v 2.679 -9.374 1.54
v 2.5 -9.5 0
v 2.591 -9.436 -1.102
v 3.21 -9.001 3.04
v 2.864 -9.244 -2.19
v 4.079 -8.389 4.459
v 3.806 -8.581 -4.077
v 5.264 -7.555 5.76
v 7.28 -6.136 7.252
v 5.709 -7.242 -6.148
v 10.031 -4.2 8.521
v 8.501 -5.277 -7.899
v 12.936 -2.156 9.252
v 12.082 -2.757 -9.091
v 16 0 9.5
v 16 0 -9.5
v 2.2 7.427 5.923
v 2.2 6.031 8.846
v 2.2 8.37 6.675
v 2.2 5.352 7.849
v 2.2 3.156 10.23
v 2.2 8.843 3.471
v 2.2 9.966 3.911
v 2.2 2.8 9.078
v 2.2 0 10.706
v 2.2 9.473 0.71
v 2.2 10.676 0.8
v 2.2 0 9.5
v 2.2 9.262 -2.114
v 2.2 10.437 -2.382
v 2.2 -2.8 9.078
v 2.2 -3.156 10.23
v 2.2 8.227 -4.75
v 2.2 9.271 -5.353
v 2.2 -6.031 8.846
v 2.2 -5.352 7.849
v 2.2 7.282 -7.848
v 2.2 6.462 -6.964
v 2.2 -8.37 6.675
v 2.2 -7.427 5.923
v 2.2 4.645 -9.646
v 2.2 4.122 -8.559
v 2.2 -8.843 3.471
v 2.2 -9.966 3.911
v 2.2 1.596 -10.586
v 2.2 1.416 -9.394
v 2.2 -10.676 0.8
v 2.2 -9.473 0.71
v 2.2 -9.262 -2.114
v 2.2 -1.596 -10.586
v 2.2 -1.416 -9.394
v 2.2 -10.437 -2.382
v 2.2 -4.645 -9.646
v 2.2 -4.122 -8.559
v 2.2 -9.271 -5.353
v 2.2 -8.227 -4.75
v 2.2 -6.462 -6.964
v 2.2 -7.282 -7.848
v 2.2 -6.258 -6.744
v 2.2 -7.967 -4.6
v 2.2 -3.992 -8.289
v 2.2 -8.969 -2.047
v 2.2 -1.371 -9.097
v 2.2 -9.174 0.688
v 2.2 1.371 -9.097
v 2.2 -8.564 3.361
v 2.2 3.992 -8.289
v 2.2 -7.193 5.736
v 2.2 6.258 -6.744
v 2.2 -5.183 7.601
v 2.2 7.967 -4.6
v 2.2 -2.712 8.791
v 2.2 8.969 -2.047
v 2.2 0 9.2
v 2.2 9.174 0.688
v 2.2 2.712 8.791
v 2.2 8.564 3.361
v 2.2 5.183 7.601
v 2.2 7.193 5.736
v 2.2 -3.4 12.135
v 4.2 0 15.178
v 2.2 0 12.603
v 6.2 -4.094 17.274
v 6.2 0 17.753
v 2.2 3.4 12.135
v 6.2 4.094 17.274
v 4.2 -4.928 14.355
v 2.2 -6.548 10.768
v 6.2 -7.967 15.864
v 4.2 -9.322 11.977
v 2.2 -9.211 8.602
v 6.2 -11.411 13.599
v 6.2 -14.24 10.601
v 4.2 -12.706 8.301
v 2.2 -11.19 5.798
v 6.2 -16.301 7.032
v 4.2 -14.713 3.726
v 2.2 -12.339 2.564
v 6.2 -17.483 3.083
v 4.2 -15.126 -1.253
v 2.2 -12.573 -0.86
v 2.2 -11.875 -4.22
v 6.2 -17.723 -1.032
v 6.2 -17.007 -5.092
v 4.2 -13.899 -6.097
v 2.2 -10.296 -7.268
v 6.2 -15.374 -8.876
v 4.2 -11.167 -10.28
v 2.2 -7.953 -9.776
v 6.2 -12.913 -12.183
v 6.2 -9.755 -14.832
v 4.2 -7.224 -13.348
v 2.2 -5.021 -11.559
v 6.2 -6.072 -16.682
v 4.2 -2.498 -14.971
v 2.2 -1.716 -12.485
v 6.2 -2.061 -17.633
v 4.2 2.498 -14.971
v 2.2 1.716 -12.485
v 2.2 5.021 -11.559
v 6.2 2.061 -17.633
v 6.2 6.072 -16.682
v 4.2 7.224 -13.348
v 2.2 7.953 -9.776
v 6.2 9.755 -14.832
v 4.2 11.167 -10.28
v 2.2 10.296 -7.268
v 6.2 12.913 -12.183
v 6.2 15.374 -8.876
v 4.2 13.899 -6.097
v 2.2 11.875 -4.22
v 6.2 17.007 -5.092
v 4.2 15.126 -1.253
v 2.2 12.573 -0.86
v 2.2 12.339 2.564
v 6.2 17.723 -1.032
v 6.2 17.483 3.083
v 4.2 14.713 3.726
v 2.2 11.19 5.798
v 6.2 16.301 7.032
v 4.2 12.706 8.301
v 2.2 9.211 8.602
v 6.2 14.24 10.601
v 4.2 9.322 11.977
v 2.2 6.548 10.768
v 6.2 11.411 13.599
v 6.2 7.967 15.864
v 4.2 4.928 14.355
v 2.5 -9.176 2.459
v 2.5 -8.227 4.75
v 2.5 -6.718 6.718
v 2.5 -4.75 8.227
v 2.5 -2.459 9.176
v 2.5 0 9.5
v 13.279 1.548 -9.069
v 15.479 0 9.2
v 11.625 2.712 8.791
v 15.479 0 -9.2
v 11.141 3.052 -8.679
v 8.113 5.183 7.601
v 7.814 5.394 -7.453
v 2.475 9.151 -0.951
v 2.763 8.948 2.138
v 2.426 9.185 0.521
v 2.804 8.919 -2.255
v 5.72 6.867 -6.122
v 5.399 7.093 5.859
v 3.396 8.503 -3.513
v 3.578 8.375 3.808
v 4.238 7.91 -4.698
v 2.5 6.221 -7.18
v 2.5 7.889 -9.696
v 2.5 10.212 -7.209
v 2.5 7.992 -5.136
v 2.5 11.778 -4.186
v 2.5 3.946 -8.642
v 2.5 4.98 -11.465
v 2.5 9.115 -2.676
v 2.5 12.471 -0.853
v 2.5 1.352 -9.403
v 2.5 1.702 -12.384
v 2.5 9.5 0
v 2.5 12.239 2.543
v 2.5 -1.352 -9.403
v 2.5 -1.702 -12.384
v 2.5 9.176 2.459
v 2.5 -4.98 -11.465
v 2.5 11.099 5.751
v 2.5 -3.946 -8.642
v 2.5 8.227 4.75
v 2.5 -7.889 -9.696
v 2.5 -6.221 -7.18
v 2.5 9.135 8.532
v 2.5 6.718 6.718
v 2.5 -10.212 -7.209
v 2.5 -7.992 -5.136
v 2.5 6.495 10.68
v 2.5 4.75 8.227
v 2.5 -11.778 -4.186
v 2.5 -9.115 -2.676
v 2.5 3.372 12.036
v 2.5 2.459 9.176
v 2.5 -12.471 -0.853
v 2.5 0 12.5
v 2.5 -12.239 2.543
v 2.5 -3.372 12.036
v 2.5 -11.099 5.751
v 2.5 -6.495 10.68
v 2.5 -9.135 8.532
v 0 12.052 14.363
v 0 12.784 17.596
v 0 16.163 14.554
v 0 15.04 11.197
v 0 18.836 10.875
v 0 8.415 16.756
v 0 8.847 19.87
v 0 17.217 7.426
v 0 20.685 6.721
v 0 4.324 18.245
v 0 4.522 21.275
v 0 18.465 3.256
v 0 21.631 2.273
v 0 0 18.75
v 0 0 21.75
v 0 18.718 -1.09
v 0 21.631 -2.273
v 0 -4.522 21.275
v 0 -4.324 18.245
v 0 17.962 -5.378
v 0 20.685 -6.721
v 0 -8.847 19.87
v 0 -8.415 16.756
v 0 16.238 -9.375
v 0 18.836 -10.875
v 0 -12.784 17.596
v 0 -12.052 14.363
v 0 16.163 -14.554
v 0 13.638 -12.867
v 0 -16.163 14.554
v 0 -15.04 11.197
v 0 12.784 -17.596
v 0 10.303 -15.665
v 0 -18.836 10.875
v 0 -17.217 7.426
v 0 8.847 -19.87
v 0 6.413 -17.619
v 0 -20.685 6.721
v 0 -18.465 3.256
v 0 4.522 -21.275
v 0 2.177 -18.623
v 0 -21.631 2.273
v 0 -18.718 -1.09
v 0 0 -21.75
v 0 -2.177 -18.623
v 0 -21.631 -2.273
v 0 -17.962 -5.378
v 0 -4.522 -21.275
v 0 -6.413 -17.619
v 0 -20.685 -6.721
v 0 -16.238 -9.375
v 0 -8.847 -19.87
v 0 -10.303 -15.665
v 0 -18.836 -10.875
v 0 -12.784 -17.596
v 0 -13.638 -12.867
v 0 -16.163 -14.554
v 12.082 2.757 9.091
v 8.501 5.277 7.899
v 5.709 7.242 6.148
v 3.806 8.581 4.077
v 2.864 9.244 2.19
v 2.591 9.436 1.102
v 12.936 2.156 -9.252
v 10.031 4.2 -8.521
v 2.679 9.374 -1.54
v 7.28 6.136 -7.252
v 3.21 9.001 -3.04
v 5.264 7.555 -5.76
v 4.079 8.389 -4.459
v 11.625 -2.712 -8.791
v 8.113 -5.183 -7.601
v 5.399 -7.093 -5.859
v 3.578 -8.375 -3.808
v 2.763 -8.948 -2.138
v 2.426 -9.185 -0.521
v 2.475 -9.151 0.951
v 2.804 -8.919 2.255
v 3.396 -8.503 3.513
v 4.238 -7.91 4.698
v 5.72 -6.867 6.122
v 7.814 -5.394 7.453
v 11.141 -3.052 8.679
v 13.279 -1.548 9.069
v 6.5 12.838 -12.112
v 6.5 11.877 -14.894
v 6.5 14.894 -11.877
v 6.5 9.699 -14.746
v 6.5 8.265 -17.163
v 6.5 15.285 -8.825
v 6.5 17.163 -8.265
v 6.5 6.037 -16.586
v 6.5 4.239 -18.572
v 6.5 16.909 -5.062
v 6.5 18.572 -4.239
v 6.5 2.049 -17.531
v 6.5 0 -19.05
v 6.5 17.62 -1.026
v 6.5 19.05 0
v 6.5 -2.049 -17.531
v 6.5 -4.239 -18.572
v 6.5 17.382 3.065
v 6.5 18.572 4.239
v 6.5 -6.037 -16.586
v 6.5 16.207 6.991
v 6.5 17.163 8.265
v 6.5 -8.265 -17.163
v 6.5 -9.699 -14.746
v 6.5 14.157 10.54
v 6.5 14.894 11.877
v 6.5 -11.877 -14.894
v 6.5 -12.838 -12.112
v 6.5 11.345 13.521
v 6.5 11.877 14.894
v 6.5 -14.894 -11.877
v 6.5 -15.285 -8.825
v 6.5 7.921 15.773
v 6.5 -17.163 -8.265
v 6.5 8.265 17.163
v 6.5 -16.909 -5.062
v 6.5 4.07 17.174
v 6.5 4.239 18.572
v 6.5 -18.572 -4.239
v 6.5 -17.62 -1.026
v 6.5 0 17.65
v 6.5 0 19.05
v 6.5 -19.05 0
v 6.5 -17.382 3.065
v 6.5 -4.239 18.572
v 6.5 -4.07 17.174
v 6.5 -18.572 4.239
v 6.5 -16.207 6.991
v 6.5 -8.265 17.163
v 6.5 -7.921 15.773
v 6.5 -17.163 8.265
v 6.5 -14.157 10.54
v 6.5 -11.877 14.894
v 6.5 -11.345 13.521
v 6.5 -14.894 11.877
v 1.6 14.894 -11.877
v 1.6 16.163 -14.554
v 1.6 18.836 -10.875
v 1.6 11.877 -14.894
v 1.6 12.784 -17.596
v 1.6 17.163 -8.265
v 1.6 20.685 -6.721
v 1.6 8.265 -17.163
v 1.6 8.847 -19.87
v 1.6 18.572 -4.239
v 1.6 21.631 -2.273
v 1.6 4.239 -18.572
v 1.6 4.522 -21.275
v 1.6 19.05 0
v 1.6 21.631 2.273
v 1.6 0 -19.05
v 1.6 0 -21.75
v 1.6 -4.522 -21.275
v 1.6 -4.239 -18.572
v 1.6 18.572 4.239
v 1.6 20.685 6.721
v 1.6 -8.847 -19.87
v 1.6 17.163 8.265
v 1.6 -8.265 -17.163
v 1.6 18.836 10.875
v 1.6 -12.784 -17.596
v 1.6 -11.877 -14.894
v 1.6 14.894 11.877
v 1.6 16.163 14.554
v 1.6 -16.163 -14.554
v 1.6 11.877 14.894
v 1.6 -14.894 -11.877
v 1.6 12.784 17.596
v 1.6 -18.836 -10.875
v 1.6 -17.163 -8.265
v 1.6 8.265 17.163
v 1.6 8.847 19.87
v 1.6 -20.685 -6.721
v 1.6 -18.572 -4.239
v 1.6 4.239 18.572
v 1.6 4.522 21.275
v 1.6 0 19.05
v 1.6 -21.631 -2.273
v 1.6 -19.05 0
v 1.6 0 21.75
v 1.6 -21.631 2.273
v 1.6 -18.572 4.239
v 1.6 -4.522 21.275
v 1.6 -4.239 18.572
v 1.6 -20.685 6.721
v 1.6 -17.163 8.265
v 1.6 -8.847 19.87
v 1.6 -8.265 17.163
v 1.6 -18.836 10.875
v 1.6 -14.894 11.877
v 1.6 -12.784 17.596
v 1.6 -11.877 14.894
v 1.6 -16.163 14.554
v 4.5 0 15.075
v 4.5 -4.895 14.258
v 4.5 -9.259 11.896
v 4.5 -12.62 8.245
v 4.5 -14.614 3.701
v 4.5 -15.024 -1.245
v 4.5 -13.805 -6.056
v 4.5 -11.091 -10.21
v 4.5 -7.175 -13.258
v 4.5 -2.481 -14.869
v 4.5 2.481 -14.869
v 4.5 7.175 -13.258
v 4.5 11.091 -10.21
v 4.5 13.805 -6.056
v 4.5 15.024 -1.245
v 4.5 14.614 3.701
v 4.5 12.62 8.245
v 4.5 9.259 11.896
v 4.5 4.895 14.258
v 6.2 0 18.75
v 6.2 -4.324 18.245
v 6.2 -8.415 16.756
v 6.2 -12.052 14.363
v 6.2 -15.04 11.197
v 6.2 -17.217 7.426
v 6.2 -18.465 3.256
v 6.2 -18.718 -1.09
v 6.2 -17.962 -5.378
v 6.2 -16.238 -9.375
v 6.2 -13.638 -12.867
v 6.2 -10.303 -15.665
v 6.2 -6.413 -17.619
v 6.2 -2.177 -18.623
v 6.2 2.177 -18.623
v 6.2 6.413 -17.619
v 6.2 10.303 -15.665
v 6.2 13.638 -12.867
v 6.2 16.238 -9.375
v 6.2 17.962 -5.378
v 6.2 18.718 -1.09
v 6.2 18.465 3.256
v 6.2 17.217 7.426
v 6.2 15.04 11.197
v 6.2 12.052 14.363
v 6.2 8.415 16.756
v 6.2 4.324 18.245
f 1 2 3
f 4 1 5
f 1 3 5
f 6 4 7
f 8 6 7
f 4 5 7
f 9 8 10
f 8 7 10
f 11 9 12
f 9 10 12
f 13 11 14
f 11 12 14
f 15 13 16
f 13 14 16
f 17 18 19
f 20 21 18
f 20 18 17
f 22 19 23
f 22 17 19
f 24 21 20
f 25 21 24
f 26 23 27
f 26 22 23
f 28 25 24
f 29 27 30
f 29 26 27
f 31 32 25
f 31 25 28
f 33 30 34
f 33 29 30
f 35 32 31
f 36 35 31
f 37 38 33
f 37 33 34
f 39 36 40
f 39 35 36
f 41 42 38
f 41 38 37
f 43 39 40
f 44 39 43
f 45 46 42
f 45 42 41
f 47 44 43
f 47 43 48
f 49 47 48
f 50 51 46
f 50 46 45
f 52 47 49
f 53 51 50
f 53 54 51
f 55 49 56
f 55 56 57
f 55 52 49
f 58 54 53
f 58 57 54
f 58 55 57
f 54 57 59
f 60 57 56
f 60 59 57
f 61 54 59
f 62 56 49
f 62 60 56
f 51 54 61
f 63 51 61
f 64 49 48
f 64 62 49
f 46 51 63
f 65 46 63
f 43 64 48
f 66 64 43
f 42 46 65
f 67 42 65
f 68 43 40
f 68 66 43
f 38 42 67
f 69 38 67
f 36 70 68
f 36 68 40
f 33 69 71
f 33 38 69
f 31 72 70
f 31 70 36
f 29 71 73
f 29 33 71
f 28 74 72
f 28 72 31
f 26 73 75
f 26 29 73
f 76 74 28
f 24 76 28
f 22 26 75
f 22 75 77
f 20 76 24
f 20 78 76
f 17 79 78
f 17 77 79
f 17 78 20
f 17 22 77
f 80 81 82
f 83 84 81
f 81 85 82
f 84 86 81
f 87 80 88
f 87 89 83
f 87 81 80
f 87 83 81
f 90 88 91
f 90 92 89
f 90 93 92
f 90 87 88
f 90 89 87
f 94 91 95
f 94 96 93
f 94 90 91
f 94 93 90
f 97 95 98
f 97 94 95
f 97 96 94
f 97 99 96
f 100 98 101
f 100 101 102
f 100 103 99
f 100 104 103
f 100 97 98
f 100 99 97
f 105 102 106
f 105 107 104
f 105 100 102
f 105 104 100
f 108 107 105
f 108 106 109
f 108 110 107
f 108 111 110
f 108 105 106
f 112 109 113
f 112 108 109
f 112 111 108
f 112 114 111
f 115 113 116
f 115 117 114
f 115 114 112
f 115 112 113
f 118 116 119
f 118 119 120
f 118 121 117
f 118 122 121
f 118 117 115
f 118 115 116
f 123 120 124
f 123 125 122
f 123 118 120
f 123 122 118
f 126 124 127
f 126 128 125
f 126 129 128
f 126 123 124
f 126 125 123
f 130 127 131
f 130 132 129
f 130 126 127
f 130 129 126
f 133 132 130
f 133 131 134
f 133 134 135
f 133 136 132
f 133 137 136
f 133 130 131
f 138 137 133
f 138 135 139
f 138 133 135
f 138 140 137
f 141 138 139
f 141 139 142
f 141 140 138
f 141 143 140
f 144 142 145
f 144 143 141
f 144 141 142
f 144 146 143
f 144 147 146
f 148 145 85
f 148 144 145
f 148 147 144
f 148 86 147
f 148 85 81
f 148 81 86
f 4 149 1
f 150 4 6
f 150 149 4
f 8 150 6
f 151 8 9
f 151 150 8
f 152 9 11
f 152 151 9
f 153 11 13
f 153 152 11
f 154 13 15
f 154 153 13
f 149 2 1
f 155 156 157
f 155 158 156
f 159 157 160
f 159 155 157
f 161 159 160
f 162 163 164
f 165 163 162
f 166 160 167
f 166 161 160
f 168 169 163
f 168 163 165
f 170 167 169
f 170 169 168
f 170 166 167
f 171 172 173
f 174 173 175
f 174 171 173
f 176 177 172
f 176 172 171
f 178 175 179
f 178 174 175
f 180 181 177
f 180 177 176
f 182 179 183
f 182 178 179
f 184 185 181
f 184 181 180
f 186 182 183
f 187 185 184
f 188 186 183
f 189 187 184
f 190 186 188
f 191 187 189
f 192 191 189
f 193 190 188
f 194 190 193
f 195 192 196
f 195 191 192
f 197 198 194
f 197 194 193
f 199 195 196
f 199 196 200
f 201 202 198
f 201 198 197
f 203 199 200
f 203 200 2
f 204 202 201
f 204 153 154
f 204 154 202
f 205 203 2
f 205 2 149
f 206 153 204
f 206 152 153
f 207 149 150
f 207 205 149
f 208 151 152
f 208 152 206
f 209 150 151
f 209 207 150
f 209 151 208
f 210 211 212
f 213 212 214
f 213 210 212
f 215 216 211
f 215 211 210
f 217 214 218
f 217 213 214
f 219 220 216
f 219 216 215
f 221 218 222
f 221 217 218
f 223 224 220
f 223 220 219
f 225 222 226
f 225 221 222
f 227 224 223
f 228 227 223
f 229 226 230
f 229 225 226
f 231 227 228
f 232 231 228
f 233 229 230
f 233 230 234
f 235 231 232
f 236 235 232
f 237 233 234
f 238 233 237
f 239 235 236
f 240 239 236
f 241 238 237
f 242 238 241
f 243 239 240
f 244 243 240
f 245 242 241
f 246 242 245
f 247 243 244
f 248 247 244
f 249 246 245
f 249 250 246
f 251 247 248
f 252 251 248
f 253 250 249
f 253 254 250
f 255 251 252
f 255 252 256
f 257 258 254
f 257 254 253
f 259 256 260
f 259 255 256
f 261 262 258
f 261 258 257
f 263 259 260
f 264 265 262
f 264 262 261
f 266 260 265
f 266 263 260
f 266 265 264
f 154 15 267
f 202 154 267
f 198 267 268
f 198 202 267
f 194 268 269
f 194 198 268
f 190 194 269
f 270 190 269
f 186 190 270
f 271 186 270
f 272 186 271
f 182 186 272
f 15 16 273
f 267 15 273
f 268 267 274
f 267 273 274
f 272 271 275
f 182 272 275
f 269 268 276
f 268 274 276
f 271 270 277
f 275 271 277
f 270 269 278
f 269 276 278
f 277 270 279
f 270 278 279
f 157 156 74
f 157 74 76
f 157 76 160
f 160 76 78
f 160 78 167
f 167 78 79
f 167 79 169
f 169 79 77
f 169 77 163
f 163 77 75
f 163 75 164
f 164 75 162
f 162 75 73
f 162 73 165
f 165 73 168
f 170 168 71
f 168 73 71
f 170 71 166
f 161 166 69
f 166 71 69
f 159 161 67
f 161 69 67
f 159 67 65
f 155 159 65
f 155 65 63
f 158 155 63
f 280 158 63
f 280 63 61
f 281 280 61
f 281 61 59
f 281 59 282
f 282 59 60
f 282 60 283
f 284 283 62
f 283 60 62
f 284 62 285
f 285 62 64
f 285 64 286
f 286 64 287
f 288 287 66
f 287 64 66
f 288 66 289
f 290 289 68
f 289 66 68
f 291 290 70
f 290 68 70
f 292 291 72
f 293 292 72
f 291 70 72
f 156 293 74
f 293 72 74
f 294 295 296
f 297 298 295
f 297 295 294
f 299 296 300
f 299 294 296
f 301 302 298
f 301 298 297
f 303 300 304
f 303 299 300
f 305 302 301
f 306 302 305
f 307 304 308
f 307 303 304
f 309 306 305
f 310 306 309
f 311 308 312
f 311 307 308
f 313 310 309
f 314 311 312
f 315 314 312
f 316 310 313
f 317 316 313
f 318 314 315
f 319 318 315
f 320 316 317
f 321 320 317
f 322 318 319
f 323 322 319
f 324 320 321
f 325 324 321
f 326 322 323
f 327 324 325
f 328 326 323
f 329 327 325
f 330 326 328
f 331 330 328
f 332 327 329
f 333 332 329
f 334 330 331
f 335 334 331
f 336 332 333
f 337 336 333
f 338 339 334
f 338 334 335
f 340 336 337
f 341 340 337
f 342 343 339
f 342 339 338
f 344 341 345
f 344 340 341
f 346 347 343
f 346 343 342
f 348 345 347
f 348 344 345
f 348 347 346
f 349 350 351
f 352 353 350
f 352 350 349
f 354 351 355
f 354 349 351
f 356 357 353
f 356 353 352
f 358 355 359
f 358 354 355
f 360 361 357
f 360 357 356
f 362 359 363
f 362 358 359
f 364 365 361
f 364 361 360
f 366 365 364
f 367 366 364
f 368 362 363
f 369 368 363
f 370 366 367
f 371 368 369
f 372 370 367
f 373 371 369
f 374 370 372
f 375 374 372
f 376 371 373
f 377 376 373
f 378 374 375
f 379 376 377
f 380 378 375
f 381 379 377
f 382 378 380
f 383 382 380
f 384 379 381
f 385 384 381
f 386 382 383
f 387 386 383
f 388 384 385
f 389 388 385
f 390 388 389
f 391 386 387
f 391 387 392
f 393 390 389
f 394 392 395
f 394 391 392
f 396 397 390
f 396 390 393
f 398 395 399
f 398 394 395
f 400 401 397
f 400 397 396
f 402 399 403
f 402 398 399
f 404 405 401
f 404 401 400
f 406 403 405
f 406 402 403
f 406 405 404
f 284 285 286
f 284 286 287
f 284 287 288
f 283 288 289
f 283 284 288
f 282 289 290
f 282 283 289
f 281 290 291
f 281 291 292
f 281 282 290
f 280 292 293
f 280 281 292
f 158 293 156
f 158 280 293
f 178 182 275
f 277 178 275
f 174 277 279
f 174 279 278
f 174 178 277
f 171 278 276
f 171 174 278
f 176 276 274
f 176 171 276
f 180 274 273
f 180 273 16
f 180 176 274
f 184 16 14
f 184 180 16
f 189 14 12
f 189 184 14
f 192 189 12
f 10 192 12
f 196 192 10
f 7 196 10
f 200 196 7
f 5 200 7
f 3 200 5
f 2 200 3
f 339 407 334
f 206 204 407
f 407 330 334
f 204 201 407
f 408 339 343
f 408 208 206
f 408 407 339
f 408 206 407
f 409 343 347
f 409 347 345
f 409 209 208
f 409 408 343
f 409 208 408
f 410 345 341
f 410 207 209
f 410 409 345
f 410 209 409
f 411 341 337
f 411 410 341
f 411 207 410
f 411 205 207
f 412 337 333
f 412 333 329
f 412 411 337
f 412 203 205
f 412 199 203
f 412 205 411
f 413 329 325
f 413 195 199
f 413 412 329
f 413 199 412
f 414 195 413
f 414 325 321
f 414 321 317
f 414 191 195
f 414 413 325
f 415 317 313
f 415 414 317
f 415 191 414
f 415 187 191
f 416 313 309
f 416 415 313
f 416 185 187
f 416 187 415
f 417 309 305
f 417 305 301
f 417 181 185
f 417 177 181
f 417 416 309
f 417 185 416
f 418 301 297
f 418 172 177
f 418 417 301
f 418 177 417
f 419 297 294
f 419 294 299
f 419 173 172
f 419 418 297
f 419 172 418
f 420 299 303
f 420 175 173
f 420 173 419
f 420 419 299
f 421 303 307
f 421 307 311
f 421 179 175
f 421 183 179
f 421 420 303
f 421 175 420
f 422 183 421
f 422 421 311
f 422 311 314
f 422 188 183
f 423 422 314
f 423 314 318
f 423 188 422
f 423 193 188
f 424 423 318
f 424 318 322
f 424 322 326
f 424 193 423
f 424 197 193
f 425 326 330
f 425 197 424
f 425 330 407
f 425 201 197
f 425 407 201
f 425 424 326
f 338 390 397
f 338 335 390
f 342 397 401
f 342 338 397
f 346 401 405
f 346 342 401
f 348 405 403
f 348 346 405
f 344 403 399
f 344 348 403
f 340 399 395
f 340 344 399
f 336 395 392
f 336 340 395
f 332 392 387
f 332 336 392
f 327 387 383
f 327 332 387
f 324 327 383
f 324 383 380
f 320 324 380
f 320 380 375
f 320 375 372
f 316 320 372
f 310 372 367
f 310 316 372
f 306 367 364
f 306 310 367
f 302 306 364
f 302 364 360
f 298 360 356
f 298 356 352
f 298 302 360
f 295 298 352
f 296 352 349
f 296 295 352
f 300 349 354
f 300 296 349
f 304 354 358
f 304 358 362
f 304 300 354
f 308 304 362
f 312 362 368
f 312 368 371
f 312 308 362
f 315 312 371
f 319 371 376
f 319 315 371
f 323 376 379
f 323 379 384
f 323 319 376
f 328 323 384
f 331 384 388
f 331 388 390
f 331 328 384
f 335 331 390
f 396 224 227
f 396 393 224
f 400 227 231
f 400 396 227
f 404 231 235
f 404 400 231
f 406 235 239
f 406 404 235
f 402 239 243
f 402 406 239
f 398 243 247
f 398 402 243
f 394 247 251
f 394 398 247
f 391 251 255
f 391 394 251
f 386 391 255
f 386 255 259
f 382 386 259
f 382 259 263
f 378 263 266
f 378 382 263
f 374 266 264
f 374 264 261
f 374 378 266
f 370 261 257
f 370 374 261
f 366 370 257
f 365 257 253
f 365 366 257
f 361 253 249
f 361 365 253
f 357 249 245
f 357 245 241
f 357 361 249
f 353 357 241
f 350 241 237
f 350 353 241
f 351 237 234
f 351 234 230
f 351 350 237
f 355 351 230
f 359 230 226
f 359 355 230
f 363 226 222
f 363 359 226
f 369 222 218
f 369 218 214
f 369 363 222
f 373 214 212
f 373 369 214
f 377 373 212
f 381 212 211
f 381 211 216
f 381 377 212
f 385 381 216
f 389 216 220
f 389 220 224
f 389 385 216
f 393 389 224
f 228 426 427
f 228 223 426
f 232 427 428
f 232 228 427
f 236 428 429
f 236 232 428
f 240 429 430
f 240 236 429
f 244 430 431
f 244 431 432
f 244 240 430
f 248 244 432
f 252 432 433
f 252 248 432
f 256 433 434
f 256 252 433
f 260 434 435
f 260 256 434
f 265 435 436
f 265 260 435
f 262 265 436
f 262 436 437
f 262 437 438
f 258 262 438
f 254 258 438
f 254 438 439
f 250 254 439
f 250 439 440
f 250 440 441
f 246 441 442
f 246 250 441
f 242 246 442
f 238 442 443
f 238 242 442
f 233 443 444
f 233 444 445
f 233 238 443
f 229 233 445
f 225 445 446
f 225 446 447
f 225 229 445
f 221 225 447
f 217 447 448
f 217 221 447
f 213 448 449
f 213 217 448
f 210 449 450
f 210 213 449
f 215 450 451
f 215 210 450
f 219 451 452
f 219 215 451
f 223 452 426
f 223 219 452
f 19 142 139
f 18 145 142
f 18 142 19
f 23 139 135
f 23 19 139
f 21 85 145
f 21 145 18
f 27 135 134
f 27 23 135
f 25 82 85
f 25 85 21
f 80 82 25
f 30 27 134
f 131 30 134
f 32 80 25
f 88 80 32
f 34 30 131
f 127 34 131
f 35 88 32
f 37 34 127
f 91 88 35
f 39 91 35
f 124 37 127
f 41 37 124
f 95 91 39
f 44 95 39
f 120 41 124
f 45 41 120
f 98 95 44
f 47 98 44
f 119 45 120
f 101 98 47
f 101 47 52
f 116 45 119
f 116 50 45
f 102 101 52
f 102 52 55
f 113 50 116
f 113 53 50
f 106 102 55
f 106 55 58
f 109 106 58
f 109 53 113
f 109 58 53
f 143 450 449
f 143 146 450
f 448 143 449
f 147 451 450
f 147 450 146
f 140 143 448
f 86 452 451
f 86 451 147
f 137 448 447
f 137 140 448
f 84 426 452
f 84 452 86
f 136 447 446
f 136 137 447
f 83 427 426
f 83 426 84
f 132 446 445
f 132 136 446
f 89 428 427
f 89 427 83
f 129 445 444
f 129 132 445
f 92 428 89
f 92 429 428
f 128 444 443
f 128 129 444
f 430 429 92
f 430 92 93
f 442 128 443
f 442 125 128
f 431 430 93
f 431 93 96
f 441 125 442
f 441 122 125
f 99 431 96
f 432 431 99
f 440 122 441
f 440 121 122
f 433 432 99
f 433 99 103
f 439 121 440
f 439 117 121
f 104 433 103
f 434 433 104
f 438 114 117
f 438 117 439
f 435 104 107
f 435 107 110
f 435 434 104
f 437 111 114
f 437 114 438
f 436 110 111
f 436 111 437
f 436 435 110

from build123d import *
from build123d.topology import SkipClean

# Parameters (mm, degrees)
SKETCH3_R               = 9.5
BOSS_EXTRUDE1_DEPTH     = 16
CUT_EXTRUDE1_DEPTH      = 21.892582416
CUT_EXTRUDE1_DEPTH_BACK = 21.892582416
SHELL7_T                = -0.3
SKETCH8_R               = 10.705762979
CUT_EXTRUDE5_DEPTH      = 10


with BuildPart() as part:
    # Sketch3 → Boss-Extrude1 (new body)
    with BuildSketch(Plane.ZY):
        Circle(SKETCH3_R)
    extrude(amount=-BOSS_EXTRUDE1_DEPTH)

    # Sketch4 → Cut-Extrude1 (cut, two sides: drawn at the far end of the back side and taken through both)
    with BuildSketch(Plane.XY.offset(-CUT_EXTRUDE1_DEPTH_BACK)):
        Polygon((2.5, 9.5), (18.05891099, 17.267926144), (18.05891099, -17.267926144), (2.5, -9.5), (16, 0), align=None)
    extrude(amount=CUT_EXTRUDE1_DEPTH + CUT_EXTRUDE1_DEPTH_BACK, mode=Mode.SUBTRACT)

    # Shell7
    shell7_openings = [part.faces().sort_by_distance(p)[0] for p in [
        (0, 0, 0),
    ]]
    offset(amount=SHELL7_T, openings=shell7_openings, kind=Kind.INTERSECTION)

    # Sketch1 → Revolve1 (revolve)
    with SkipClean():  # the faces are left unmerged after this step: merging them gives an invalid solid
        with BuildSketch(Plane.XY, mode=Mode.PRIVATE) as revolve1_sk:
            Polygon((0, 18.75), (0, 21.75), (1.6, 21.75), (1.6, 19.05), (6.5, 19.05), (6.5, 17.65), (2.5, 12.5), (2.5, 9.5), (2.2, 9.5), (2.2, 12.602819589), (6.2, 17.752819589), (6.2, 18.75), align=None)
        revolve(revolve1_sk.sketch.rotate(Axis((0, 0, 0), (1, 0, 0)), 90), axis=Axis((0, 0, 0), (1, 0, 0)))

    # Sketch8 → Cut-Extrude5 (cut)
    with SkipClean():  # the faces are left unmerged after this step: merging them gives an invalid solid
        with BuildSketch(Plane.ZY.offset(-2.2)):
            Circle(SKETCH8_R)
        extrude(amount=CUT_EXTRUDE5_DEPTH, mode=Mode.SUBTRACT)


solid = part.part
